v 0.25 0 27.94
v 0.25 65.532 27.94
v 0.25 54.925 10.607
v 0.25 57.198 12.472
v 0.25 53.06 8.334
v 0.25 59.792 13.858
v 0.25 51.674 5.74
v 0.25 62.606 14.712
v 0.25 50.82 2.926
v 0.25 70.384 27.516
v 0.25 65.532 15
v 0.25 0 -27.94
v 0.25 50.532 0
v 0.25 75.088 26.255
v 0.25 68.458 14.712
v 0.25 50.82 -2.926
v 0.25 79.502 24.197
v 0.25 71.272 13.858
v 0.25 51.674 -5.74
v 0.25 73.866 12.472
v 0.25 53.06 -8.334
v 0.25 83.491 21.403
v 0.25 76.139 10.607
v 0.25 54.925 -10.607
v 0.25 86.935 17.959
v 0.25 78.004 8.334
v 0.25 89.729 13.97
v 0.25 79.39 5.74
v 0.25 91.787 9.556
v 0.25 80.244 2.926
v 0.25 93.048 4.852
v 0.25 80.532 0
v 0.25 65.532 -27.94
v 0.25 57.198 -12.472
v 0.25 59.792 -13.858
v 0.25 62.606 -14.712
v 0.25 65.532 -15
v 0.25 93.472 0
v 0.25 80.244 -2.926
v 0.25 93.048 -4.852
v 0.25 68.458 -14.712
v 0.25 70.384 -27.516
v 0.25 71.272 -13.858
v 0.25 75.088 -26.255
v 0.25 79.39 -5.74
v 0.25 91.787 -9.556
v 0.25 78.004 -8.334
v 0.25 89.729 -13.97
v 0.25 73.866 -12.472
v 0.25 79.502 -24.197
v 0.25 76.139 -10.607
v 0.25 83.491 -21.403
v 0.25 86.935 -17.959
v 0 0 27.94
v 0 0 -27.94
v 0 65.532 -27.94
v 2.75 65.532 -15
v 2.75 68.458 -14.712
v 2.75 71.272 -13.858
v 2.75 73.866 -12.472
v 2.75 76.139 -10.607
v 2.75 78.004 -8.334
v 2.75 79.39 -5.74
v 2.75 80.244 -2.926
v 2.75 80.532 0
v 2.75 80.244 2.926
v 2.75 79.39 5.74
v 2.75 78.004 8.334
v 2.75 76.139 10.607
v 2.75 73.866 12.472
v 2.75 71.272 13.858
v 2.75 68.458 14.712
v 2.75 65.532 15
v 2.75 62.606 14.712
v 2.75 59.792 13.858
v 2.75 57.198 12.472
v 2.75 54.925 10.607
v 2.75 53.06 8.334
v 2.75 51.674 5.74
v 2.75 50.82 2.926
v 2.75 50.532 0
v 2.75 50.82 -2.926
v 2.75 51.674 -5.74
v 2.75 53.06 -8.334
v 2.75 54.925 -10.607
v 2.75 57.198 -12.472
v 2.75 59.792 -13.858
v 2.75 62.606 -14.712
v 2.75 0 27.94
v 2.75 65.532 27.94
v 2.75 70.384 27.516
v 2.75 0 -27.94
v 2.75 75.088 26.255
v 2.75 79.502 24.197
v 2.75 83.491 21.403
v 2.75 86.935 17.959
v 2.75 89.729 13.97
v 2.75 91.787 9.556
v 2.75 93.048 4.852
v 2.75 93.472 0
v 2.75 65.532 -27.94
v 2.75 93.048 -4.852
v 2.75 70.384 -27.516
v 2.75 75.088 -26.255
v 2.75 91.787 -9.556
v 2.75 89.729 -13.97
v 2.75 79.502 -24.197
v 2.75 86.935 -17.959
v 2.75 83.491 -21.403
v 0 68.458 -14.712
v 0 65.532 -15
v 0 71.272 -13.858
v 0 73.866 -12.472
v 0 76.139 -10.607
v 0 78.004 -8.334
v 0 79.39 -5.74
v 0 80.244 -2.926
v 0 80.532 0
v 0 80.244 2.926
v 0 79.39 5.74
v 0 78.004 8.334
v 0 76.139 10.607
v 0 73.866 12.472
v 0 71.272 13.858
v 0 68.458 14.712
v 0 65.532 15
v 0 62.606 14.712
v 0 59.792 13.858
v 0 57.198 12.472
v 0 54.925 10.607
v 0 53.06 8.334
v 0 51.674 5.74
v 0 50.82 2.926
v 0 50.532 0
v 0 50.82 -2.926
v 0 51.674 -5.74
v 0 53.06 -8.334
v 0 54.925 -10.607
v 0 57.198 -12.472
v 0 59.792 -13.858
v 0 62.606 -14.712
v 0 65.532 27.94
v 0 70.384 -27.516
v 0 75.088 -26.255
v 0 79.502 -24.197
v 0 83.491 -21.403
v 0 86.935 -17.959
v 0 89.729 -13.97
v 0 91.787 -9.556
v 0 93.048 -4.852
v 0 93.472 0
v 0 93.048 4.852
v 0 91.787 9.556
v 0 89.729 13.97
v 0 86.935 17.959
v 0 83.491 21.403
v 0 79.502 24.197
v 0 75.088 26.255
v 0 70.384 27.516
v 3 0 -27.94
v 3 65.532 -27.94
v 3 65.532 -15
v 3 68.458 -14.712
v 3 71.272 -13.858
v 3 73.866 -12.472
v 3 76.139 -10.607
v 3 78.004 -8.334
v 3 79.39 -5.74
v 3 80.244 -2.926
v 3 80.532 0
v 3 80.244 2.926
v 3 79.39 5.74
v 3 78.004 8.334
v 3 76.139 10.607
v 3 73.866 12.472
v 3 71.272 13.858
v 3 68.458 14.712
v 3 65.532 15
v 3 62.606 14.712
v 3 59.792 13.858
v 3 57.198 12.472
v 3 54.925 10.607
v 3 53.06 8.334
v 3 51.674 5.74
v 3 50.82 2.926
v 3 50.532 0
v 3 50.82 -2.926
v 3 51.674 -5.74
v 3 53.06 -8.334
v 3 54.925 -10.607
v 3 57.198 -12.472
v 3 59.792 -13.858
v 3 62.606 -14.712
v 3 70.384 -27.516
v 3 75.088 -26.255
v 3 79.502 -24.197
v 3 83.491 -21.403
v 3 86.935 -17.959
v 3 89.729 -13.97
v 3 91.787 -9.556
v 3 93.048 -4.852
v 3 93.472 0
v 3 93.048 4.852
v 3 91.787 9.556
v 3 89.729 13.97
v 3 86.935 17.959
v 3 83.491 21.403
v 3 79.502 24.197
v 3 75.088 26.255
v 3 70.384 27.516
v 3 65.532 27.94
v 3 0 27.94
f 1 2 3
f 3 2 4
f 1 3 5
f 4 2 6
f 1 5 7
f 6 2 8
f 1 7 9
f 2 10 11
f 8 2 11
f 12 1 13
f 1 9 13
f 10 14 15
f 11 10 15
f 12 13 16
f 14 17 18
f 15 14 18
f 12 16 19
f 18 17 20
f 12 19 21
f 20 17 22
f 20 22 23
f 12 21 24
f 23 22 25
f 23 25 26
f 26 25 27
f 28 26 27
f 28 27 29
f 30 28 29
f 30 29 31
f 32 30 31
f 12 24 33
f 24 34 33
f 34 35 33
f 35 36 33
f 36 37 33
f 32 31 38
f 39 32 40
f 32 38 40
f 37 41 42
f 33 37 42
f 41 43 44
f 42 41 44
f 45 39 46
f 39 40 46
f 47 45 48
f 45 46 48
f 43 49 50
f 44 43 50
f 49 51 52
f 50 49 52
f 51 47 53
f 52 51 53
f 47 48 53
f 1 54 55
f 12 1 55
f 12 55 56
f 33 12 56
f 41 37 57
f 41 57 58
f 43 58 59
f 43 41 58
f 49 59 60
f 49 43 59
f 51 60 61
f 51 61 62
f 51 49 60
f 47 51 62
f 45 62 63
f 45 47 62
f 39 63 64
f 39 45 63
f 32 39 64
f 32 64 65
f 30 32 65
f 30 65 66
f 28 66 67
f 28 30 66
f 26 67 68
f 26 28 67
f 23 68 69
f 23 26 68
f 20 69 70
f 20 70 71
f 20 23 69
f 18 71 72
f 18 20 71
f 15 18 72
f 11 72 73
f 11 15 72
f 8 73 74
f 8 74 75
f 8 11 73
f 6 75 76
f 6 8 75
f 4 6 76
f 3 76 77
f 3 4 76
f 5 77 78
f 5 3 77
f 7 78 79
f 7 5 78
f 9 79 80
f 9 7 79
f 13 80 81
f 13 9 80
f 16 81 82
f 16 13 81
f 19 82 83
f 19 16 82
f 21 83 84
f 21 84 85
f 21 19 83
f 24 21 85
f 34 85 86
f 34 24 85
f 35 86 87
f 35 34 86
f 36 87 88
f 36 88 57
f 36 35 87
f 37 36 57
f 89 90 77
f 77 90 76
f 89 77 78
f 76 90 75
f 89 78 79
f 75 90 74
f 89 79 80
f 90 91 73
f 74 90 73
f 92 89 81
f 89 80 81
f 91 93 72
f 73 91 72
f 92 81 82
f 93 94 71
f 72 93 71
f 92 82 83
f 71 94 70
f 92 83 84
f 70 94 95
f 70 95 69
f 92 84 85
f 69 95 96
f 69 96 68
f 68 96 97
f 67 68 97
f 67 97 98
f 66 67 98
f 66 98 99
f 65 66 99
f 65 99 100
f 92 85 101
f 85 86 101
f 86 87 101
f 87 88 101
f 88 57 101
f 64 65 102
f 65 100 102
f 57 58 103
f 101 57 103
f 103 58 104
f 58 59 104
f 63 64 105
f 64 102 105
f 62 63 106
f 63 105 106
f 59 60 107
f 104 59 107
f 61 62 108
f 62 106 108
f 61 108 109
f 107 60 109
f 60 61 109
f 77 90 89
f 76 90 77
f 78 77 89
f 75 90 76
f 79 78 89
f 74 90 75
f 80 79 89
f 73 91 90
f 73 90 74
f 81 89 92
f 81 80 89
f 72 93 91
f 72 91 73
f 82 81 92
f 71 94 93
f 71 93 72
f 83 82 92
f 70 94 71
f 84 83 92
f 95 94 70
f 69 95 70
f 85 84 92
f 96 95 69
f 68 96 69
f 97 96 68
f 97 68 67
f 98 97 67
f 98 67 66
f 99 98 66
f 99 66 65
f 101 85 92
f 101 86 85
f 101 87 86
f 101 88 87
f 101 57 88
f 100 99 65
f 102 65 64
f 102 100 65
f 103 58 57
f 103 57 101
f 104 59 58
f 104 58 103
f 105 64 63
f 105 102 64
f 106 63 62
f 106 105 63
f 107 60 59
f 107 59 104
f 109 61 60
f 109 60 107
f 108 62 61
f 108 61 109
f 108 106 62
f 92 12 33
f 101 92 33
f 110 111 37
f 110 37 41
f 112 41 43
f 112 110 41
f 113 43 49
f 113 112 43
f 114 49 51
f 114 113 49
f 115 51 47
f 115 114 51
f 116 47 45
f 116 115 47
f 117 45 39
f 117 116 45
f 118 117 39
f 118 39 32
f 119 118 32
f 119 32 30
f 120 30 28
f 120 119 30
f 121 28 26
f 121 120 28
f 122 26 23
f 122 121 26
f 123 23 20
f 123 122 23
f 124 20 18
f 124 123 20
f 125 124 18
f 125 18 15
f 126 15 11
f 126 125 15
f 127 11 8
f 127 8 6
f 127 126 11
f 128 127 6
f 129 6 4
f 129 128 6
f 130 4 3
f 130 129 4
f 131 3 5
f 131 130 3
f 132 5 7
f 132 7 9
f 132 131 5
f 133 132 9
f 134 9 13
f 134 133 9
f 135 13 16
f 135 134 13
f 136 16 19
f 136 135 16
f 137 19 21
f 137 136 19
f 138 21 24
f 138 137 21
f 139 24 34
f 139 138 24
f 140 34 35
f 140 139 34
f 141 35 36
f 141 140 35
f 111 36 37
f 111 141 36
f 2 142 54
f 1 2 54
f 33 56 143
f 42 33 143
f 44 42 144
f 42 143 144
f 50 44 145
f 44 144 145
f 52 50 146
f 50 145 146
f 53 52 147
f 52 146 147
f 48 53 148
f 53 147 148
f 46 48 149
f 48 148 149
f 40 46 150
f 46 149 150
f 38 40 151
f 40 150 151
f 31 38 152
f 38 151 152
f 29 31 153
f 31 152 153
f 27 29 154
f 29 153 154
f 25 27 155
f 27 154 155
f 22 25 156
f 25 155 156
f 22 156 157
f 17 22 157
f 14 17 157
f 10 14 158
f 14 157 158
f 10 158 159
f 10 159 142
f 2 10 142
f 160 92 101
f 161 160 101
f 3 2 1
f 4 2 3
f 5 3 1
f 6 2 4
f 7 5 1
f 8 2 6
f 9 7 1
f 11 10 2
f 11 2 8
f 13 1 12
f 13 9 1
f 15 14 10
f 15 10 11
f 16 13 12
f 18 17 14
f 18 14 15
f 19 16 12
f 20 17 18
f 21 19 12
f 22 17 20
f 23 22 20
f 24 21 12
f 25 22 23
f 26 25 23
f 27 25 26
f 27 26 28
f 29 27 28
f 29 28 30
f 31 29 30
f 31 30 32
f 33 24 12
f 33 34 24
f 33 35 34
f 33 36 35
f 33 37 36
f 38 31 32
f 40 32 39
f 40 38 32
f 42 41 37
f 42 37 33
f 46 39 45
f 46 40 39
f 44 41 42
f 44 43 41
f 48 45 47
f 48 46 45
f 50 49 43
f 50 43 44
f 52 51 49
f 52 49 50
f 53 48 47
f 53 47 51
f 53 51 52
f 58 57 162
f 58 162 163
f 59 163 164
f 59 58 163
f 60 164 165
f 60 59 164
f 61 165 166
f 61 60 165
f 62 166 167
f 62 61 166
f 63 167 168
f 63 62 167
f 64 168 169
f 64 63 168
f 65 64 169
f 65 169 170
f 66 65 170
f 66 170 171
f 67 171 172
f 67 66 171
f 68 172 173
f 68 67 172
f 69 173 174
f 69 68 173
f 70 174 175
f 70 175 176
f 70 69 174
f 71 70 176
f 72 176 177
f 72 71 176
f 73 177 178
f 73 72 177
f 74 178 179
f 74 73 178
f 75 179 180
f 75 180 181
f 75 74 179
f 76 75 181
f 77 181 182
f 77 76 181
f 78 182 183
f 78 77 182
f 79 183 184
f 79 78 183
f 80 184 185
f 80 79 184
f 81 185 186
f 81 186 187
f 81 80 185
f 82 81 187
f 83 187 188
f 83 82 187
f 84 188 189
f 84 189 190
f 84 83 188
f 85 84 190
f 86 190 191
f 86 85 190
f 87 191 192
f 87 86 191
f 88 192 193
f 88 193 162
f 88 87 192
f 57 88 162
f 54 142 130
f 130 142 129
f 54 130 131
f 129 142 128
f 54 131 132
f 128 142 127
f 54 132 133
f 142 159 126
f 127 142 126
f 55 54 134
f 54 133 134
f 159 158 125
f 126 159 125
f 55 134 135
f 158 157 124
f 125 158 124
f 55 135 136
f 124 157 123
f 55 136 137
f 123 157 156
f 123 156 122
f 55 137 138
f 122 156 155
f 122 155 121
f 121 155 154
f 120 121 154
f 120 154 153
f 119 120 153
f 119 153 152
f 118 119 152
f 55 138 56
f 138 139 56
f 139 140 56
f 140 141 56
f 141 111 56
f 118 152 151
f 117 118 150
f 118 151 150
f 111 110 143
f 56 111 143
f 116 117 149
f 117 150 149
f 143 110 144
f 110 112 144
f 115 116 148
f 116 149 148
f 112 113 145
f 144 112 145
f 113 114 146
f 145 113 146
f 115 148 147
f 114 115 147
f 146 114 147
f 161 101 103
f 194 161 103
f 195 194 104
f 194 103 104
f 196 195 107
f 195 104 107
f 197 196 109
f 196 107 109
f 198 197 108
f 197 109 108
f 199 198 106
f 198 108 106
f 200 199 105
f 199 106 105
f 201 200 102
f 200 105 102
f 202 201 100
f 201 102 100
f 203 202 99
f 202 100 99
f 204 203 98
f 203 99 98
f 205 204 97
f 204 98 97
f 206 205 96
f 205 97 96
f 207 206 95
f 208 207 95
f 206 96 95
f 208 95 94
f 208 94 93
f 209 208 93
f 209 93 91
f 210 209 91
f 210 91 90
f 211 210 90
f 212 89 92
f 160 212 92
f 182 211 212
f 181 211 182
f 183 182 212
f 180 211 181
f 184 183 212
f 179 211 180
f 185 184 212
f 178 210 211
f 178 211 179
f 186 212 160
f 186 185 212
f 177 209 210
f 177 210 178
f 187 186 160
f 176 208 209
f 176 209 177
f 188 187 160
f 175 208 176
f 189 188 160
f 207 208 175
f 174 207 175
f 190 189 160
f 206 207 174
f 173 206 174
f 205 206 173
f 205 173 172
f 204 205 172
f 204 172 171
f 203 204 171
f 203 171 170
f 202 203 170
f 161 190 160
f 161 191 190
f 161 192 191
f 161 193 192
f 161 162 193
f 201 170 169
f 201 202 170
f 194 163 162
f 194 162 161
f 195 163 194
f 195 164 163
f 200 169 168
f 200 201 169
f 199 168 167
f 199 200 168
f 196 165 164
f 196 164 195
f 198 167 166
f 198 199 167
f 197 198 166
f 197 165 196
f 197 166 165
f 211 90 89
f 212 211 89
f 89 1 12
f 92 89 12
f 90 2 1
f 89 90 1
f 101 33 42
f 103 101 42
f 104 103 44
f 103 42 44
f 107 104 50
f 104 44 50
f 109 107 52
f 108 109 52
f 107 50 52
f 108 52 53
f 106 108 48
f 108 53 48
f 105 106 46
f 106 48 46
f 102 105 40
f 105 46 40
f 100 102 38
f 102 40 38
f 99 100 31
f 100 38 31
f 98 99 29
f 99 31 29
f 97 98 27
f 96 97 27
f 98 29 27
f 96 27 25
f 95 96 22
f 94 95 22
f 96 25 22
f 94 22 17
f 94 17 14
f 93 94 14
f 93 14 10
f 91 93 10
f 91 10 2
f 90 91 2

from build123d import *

# Parameters (mm, degrees)
SKETCH1_R           = 15
BOSS_EXTRUDE1_DEPTH = 0.25
SKETCH2_R           = 15
BOSS_EXTRUDE2_DEPTH = 2.5
SKETCH3_R           = 15
BOSS_EXTRUDE3_DEPTH = 0.25


with BuildPart() as part:
    # Sketch1 → Boss-Extrude1 (new body)
    with BuildSketch(Plane(origin=(0, 0, 0), x_dir=(0, 0, -1), z_dir=(1, 0, 0))):
        with BuildLine():
            Line((-27.94, 65.532), (-27.94, 0))
            Line((-27.94, 0), (27.94, 0))
            Line((27.94, 0), (27.94, 65.532))
            ThreePointArc((27.94, 65.532), (0, 93.472), (-27.94, 65.532))
        make_face()
        with Locations((0, 65.532)):
            Circle(SKETCH1_R, mode=Mode.SUBTRACT)
    extrude(amount=BOSS_EXTRUDE1_DEPTH)


with BuildPart() as body_2:
    # Sketch2 → Boss-Extrude2 (new body)
    with BuildSketch(Plane(origin=(0.25, 0, 0), x_dir=(0, 0, -1), z_dir=(1, 0, 0))):
        with BuildLine():
            Line((27.94, 0), (27.94, 65.532))
            ThreePointArc((27.94, 65.532), (0, 93.472), (-27.94, 65.532))
            Line((-27.94, 65.532), (-27.94, 0))
            Line((-27.94, 0), (27.94, 0))
        make_face()
        with Locations((0, 65.532)):
            Circle(SKETCH2_R, mode=Mode.SUBTRACT)
    extrude(amount=BOSS_EXTRUDE2_DEPTH)


with BuildPart() as body_3:
    # Sketch3 → Boss-Extrude3 (new body)
    with BuildSketch(Plane(origin=(2.75, 0, 0), x_dir=(0, 0, -1), z_dir=(1, 0, 0))):
        with BuildLine():
            Line((-27.94, 0), (27.94, 0))
            Line((27.94, 0), (27.94, 65.532))
            ThreePointArc((27.94, 65.532), (0, 93.472), (-27.94, 65.532))
            Line((-27.94, 65.532), (-27.94, 0))
        make_face()
        with Locations((0, 65.532)):
            Circle(SKETCH3_R, mode=Mode.SUBTRACT)
    extrude(amount=BOSS_EXTRUDE3_DEPTH)


solid = Compound([part.part, body_2.part, body_3.part])
